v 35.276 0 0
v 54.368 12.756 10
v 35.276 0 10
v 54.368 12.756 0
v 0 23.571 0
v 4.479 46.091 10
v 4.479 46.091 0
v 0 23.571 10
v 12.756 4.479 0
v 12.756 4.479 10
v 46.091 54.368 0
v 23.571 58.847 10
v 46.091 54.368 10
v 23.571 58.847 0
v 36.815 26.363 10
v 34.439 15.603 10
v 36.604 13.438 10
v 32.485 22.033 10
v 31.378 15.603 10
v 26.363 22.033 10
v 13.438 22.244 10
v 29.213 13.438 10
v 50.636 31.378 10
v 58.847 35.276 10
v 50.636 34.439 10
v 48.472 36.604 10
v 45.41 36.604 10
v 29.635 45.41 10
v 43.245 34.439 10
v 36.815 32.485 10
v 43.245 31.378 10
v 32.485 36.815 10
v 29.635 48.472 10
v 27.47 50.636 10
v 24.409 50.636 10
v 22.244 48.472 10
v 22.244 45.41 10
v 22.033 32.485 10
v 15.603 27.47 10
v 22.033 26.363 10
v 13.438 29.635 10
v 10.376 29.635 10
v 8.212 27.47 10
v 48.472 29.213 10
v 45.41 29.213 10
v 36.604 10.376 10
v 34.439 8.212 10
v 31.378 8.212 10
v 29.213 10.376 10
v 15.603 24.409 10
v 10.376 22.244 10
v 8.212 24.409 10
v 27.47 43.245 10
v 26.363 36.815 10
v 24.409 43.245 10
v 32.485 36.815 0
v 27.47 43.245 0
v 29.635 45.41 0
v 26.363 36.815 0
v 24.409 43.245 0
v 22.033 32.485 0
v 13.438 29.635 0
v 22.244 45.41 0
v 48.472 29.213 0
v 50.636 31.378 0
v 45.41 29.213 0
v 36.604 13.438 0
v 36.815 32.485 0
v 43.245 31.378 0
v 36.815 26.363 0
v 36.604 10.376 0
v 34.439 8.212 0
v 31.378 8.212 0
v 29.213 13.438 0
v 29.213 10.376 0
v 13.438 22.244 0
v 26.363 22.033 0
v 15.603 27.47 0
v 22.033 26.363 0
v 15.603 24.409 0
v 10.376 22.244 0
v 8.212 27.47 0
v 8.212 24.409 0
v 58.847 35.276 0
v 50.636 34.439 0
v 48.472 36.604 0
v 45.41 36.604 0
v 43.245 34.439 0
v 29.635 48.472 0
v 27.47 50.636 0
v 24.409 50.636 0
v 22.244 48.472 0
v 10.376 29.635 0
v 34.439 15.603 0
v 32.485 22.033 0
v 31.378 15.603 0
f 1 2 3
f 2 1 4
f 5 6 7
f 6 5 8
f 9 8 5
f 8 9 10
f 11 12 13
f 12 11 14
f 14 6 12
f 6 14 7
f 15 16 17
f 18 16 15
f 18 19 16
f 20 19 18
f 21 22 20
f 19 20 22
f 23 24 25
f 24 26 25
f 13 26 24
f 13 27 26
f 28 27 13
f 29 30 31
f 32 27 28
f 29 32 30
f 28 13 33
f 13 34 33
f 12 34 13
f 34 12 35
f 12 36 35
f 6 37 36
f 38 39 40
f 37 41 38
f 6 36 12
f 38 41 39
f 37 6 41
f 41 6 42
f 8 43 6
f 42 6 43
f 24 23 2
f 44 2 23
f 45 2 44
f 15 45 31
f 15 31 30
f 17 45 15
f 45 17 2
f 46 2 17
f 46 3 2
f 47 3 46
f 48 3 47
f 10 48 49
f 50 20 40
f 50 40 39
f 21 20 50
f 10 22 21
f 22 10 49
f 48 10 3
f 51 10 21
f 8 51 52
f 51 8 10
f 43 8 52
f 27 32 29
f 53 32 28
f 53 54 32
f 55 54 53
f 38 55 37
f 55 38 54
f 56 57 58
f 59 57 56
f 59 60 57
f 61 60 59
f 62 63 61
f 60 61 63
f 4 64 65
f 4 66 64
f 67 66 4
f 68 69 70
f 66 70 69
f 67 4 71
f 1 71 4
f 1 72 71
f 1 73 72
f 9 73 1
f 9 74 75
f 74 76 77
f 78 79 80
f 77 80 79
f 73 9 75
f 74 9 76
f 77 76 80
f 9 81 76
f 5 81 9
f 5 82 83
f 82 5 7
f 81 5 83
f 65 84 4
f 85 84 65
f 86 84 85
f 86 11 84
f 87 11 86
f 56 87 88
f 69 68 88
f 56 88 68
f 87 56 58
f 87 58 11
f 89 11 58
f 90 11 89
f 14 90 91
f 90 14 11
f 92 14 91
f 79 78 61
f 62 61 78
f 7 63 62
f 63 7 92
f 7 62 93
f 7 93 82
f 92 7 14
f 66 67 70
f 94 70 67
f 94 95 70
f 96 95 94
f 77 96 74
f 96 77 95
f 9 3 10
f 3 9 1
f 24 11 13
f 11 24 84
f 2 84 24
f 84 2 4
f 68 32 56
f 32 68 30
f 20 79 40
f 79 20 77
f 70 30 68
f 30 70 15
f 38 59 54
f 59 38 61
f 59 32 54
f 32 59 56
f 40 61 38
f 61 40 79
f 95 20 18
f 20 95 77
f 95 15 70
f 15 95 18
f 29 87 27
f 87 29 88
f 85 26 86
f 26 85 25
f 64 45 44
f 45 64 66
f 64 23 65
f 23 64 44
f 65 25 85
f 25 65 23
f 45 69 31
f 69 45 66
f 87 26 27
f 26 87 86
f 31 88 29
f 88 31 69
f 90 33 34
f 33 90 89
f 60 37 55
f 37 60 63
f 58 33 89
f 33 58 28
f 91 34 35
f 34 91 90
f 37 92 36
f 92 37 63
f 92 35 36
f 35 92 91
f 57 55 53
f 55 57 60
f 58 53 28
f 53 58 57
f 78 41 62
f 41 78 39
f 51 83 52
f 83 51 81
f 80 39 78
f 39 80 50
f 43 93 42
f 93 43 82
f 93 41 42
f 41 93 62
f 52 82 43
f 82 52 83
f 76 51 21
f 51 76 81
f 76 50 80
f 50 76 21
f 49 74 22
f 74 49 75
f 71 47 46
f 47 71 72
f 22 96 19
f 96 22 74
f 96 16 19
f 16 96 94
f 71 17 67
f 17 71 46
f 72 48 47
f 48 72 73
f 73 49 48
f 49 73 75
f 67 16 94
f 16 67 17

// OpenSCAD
$fn = 32;

// ----------------------------------------------------------------------
// Polygon plate: 8-gon R30, 4 bolt windows
// ----------------------------------------------------------------------

// --- parameters (mm) ---
sides = 8;                // number of polygon sides
plate_r = 30;             // circumscribed radius of the polygon
bore_r = 8;               // centre bore radius
bolts = 4;                // number of bolt windows
ring_r = 17.86;           // bolt-circle radius
bolt_r = 4;               // bolt window radius
plate_t = 10;             // plate thickness, Z (extrusion height)

plate_d = 2 * plate_r;  // circumscribed diameter
bore_d = 2 * bore_r;  // centre bore diameter
bolt_d = 2 * bolt_r;  // bolt window diameter
ring_d = 2 * ring_r;  // bolt-circle diameter

profile = [[58.847, 35.276], [46.091, 54.368], [23.571, 58.847], [4.479, 46.091], [0, 23.571], [12.756, 4.479], [35.276, 0], [54.368, 12.756]];  // primary outline, 8 points, counter clockwise
void_1 = [[36.815, 32.485], [32.485, 36.815], [26.363, 36.815], [22.033, 32.485], [22.033, 26.363], [26.363, 22.033], [32.485, 22.033], [36.815, 26.363]];  // centre bore, 8 points
void_2 = [[50.636, 34.439], [48.472, 36.604], [45.41, 36.604], [43.245, 34.439], [43.245, 31.378], [45.41, 29.213], [48.472, 29.213], [50.636, 31.378]];  // bolt window 1, 8 points
void_3 = [[29.635, 48.472], [27.47, 50.636], [24.409, 50.636], [22.244, 48.472], [22.244, 45.41], [24.409, 43.245], [27.47, 43.245], [29.635, 45.41]];  // bolt window 2, 8 points
void_4 = [[15.603, 27.47], [13.438, 29.635], [10.376, 29.635], [8.212, 27.47], [8.212, 24.409], [10.376, 22.244], [13.438, 22.244], [15.603, 24.409]];  // bolt window 3, 8 points
void_5 = [[36.604, 13.438], [34.439, 15.603], [31.378, 15.603], [29.213, 13.438], [29.213, 10.376], [31.378, 8.212], [34.439, 8.212], [36.604, 10.376]];  // bolt window 4, 8 points

// --- the one profile operation ---
difference() {
  linear_extrude(height = plate_t) polygon(points = profile);
  translate([0, 0, -1])
    linear_extrude(height = plate_t + 2) polygon(points = void_1);
  translate([0, 0, -1])
    linear_extrude(height = plate_t + 2) polygon(points = void_2);
  translate([0, 0, -1])
    linear_extrude(height = plate_t + 2) polygon(points = void_3);
  translate([0, 0, -1])
    linear_extrude(height = plate_t + 2) polygon(points = void_4);
  translate([0, 0, -1])
    linear_extrude(height = plate_t + 2) polygon(points = void_5);
}
